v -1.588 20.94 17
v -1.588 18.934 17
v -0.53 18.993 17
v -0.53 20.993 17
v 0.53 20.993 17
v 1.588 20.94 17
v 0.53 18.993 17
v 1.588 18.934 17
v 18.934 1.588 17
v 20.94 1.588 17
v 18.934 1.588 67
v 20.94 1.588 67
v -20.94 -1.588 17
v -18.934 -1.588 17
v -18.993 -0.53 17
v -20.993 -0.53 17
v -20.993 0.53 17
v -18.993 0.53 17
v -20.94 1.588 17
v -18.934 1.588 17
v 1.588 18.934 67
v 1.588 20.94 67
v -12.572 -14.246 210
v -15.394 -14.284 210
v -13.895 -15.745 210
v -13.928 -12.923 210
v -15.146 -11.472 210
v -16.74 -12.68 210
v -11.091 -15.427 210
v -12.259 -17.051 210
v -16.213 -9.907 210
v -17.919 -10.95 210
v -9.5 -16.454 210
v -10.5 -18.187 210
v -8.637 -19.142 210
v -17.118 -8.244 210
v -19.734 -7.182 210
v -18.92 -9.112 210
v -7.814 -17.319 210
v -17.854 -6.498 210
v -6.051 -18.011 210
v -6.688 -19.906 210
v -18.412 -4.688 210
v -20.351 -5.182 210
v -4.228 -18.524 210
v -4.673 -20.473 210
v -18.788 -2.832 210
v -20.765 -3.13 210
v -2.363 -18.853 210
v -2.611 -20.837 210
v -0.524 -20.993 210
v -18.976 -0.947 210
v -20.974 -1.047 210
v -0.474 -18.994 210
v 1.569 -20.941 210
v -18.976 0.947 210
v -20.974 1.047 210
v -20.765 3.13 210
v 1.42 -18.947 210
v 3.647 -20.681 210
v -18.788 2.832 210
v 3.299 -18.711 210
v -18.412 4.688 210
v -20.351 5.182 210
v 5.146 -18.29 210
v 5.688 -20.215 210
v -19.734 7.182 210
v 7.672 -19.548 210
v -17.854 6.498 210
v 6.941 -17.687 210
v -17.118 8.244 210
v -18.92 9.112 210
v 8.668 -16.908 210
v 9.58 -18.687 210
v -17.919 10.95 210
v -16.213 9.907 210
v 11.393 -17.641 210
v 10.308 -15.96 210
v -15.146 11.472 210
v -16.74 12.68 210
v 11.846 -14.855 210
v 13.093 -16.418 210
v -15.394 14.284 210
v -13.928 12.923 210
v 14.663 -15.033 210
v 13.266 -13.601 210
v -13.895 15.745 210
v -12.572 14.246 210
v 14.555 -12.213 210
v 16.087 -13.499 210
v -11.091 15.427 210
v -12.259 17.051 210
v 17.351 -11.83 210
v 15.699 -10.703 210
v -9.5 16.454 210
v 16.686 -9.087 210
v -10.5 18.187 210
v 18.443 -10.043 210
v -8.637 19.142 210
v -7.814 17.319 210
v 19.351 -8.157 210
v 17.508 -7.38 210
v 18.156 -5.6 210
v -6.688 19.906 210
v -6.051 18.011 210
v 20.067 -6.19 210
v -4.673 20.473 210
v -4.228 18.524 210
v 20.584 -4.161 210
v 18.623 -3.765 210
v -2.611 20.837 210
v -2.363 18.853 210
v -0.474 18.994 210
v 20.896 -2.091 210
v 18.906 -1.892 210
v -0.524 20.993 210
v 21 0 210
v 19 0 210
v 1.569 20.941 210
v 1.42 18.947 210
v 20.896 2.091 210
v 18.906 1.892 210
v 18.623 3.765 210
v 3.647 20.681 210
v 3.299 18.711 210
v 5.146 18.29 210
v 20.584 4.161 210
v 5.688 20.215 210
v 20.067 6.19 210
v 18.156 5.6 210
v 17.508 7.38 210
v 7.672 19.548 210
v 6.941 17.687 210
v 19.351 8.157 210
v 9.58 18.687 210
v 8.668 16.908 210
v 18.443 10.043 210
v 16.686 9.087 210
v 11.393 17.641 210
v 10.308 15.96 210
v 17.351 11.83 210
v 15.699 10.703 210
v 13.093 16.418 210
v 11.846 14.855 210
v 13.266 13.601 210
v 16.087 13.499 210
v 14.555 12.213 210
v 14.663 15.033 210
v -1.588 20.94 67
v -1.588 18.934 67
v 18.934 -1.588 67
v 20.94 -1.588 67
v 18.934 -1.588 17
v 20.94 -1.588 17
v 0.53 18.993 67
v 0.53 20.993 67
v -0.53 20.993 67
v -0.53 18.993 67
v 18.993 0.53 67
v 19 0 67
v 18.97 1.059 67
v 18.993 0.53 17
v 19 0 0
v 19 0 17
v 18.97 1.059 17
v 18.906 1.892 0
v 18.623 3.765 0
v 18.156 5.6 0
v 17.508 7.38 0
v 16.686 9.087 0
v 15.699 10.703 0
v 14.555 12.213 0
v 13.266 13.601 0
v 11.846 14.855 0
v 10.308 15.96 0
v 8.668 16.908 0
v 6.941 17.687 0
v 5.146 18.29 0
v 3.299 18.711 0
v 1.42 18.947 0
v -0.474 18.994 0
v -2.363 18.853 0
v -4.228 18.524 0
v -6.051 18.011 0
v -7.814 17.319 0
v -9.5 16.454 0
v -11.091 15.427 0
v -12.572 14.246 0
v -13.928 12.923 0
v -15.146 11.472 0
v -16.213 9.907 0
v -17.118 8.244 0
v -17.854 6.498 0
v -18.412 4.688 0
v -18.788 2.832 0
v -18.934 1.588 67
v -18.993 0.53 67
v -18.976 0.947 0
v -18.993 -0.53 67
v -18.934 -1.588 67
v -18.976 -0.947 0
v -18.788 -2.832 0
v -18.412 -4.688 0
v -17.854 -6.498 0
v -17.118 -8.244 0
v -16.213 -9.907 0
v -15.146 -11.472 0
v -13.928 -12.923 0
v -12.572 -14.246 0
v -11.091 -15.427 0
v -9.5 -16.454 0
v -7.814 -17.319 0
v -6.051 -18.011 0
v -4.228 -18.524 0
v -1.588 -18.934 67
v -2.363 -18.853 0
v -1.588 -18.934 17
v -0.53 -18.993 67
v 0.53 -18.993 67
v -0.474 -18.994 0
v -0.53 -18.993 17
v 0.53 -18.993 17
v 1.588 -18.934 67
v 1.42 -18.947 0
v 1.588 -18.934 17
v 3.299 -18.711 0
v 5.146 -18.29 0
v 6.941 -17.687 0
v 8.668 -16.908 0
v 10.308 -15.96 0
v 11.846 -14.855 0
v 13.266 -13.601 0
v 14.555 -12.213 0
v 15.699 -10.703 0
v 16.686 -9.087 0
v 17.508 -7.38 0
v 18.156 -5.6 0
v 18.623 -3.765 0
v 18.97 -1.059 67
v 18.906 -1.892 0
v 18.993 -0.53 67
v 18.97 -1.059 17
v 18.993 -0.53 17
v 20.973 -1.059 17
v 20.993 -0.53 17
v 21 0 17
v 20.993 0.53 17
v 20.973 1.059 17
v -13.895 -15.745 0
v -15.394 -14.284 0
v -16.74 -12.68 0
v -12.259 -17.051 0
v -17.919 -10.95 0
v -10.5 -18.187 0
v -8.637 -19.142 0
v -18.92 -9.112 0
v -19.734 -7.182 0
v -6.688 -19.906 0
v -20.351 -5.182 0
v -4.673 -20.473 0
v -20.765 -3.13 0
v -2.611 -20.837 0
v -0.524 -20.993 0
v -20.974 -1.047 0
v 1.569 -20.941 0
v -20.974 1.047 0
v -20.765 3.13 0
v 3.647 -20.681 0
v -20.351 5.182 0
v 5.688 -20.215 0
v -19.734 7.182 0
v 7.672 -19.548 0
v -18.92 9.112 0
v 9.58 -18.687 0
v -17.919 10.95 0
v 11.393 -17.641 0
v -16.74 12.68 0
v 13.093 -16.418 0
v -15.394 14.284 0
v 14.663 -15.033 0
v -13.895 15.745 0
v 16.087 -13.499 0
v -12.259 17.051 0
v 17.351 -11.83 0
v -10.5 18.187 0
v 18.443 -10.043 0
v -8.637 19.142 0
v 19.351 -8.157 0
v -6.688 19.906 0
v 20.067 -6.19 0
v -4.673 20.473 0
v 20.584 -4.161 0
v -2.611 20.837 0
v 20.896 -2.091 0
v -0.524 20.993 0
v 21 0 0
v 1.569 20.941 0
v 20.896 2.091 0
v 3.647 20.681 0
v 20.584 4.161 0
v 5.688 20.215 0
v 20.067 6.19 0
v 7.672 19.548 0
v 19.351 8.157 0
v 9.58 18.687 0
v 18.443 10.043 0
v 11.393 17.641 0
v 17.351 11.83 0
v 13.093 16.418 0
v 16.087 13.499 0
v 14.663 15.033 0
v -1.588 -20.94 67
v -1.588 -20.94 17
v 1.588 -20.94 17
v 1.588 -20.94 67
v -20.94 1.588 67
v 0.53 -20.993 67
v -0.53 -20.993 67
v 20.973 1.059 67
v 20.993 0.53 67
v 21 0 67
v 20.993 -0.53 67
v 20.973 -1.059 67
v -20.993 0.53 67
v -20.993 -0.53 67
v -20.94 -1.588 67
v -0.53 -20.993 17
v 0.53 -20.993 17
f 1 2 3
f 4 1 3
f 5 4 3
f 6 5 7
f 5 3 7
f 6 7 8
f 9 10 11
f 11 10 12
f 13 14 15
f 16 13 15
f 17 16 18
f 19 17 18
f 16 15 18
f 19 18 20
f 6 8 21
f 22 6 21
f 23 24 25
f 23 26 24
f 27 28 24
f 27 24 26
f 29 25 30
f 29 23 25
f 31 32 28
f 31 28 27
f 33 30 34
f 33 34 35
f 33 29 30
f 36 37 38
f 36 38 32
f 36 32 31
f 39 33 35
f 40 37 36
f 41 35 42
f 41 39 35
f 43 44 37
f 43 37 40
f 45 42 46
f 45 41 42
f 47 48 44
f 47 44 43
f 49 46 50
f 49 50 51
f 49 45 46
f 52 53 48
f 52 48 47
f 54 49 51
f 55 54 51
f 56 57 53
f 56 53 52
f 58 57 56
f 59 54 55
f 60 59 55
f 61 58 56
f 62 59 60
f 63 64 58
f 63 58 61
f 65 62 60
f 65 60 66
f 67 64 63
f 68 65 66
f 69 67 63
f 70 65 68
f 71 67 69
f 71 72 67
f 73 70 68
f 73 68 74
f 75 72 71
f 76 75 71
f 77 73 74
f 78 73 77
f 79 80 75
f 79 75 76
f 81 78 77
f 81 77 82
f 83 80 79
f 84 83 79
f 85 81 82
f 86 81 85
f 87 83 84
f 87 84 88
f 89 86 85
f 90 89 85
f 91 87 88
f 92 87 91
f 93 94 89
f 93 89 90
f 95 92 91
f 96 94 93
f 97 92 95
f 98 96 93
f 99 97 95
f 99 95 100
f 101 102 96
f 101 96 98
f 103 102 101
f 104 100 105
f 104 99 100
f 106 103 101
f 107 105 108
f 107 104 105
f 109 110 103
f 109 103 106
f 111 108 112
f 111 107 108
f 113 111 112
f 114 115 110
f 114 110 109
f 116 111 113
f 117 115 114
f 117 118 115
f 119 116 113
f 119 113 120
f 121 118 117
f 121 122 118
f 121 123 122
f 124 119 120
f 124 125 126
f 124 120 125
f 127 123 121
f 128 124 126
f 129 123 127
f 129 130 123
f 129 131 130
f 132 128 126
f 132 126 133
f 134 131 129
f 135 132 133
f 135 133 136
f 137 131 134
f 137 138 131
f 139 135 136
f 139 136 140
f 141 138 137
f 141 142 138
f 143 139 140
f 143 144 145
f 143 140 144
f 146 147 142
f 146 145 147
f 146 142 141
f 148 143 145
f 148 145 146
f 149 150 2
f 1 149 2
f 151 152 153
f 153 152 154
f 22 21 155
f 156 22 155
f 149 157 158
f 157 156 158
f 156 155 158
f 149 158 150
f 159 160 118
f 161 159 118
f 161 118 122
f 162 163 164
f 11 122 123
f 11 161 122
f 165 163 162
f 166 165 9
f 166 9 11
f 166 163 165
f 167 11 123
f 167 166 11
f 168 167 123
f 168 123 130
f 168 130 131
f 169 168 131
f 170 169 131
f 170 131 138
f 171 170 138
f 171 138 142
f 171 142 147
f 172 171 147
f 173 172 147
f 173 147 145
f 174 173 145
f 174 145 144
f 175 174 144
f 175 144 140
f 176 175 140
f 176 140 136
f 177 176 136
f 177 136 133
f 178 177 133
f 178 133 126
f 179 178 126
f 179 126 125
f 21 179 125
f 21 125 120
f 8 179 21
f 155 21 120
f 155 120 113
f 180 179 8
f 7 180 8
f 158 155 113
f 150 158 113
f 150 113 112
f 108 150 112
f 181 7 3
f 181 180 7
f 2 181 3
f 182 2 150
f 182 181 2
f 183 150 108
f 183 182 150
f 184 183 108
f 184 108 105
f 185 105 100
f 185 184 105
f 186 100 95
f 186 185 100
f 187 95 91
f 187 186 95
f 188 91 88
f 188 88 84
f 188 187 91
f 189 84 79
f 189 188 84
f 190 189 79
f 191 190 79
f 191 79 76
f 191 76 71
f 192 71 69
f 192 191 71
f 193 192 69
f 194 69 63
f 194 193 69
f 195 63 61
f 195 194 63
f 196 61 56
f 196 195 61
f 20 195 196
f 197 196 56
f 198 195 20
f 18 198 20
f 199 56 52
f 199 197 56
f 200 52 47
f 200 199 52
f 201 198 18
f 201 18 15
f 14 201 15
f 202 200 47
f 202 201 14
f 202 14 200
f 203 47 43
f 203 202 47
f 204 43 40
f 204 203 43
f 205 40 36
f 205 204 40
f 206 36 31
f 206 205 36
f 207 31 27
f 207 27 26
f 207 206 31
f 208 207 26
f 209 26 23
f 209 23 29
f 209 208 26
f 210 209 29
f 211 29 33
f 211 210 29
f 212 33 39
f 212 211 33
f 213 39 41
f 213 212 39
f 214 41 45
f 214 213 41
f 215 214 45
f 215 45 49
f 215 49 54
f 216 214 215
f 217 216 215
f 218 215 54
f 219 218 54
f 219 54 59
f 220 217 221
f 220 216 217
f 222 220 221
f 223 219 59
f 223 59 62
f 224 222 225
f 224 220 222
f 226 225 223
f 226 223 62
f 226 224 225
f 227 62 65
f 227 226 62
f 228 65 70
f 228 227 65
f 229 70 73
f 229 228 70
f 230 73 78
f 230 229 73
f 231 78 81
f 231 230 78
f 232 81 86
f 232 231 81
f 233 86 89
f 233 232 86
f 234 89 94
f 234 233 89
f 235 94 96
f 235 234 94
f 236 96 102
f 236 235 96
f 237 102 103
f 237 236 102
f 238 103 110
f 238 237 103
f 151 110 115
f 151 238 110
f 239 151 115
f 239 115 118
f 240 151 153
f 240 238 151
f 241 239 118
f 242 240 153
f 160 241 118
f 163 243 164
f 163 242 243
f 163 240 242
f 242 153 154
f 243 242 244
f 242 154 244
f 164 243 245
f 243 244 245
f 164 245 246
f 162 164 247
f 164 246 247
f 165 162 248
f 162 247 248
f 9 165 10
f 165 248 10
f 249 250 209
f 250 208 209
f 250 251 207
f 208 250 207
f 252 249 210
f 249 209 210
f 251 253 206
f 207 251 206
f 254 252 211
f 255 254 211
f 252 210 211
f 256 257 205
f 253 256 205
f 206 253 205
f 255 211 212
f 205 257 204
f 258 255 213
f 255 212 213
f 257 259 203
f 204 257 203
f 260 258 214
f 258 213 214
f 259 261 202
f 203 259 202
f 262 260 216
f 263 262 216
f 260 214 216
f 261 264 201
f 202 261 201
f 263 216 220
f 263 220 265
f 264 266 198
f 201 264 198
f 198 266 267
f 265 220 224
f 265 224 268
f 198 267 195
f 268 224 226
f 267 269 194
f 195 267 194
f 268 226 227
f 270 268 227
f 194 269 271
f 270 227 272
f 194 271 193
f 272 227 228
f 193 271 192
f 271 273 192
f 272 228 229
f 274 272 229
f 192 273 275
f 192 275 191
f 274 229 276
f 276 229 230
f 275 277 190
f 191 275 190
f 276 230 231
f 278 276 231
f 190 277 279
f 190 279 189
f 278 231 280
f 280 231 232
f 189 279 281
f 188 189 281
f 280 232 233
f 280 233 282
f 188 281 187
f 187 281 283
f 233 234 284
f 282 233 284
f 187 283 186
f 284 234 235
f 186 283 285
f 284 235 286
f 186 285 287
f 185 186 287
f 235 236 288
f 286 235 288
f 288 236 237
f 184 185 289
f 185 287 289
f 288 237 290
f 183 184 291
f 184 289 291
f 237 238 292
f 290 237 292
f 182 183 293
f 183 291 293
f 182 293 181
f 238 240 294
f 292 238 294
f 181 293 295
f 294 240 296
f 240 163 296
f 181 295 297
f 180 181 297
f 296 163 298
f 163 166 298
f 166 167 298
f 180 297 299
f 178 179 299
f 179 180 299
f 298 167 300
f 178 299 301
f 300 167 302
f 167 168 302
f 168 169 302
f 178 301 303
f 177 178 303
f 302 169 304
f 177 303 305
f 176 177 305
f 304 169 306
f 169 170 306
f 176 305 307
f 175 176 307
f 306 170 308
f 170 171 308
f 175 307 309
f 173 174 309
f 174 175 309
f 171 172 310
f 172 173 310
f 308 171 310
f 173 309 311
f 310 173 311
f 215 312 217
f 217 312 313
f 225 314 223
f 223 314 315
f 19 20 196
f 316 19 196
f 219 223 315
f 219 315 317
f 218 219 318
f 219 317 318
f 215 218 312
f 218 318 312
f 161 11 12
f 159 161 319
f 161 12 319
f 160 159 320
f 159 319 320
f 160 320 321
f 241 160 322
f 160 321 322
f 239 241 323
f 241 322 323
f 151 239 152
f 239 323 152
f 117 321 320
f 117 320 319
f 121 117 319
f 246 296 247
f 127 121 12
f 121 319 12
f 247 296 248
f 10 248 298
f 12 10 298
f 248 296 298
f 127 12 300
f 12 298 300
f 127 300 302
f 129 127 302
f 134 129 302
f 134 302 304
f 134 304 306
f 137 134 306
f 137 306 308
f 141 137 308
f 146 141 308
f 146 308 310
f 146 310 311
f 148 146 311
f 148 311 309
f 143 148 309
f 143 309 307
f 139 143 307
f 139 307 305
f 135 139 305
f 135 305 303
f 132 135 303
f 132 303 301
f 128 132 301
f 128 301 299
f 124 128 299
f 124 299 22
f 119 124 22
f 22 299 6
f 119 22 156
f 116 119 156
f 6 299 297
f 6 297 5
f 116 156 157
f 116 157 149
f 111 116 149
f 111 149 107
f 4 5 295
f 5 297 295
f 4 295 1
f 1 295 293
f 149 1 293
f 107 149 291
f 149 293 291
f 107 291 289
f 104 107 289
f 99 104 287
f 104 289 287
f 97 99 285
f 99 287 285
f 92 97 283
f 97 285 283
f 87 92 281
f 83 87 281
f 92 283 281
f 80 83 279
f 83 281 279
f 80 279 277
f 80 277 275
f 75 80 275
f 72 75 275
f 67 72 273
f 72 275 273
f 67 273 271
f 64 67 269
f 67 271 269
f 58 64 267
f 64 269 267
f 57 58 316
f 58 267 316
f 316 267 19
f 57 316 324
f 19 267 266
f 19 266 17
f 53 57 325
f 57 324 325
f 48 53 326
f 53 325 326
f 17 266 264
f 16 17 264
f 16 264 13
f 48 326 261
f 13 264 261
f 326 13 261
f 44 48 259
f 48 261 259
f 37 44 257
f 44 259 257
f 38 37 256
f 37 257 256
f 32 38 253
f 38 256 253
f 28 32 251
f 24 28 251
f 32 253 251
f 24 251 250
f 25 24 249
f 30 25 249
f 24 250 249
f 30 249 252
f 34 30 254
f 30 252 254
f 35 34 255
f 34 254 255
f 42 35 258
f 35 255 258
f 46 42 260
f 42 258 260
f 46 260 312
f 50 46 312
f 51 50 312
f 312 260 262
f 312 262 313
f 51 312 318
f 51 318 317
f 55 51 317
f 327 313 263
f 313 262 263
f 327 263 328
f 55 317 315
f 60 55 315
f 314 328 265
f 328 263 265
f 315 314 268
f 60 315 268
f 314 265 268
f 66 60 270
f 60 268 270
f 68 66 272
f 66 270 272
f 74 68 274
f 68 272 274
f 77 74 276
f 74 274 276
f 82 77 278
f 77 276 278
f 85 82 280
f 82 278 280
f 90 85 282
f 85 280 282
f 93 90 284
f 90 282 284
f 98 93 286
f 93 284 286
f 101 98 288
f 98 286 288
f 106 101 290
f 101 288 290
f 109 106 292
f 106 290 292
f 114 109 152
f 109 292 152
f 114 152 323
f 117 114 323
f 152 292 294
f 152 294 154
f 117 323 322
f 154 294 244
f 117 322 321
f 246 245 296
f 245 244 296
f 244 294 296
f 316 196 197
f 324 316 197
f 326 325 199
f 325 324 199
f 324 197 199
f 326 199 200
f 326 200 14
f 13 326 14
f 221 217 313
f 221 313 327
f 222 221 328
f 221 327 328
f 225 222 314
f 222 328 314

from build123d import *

# Parameters (mm, degrees)
F0_R     = 21
F0_R_2   = 19
F1_DEPTH = 210
F3_DEPTH = 500
F5_DEPTH = 500


with BuildPart() as f1:
    # F0 (on Top) → F1 (new body)
    with BuildSketch(Plane.XY):
        Circle(F0_R)
        Circle(F0_R_2, mode=Mode.SUBTRACT)
    extrude(amount=F1_DEPTH)

    # F2 (on Front) → F3 (cut, symmetric)
    with BuildSketch(Plane.XZ):
        Polygon((-1.5875, 67), (-1.5875, 17), (0, 17), (1.5875, 17), (1.5875, 67), align=None)
    extrude(amount=F3_DEPTH, both=True, mode=Mode.SUBTRACT)

    # F4 (on Right) → F5 (cut, symmetric)
    with BuildSketch(Plane.YZ):
        Polygon((0, 17), (1.5875, 17), (1.5875, 67), (-1.5875, 67), (-1.5875, 17), align=None)
    extrude(amount=F5_DEPTH, both=True, mode=Mode.SUBTRACT)


solid = f1.part
